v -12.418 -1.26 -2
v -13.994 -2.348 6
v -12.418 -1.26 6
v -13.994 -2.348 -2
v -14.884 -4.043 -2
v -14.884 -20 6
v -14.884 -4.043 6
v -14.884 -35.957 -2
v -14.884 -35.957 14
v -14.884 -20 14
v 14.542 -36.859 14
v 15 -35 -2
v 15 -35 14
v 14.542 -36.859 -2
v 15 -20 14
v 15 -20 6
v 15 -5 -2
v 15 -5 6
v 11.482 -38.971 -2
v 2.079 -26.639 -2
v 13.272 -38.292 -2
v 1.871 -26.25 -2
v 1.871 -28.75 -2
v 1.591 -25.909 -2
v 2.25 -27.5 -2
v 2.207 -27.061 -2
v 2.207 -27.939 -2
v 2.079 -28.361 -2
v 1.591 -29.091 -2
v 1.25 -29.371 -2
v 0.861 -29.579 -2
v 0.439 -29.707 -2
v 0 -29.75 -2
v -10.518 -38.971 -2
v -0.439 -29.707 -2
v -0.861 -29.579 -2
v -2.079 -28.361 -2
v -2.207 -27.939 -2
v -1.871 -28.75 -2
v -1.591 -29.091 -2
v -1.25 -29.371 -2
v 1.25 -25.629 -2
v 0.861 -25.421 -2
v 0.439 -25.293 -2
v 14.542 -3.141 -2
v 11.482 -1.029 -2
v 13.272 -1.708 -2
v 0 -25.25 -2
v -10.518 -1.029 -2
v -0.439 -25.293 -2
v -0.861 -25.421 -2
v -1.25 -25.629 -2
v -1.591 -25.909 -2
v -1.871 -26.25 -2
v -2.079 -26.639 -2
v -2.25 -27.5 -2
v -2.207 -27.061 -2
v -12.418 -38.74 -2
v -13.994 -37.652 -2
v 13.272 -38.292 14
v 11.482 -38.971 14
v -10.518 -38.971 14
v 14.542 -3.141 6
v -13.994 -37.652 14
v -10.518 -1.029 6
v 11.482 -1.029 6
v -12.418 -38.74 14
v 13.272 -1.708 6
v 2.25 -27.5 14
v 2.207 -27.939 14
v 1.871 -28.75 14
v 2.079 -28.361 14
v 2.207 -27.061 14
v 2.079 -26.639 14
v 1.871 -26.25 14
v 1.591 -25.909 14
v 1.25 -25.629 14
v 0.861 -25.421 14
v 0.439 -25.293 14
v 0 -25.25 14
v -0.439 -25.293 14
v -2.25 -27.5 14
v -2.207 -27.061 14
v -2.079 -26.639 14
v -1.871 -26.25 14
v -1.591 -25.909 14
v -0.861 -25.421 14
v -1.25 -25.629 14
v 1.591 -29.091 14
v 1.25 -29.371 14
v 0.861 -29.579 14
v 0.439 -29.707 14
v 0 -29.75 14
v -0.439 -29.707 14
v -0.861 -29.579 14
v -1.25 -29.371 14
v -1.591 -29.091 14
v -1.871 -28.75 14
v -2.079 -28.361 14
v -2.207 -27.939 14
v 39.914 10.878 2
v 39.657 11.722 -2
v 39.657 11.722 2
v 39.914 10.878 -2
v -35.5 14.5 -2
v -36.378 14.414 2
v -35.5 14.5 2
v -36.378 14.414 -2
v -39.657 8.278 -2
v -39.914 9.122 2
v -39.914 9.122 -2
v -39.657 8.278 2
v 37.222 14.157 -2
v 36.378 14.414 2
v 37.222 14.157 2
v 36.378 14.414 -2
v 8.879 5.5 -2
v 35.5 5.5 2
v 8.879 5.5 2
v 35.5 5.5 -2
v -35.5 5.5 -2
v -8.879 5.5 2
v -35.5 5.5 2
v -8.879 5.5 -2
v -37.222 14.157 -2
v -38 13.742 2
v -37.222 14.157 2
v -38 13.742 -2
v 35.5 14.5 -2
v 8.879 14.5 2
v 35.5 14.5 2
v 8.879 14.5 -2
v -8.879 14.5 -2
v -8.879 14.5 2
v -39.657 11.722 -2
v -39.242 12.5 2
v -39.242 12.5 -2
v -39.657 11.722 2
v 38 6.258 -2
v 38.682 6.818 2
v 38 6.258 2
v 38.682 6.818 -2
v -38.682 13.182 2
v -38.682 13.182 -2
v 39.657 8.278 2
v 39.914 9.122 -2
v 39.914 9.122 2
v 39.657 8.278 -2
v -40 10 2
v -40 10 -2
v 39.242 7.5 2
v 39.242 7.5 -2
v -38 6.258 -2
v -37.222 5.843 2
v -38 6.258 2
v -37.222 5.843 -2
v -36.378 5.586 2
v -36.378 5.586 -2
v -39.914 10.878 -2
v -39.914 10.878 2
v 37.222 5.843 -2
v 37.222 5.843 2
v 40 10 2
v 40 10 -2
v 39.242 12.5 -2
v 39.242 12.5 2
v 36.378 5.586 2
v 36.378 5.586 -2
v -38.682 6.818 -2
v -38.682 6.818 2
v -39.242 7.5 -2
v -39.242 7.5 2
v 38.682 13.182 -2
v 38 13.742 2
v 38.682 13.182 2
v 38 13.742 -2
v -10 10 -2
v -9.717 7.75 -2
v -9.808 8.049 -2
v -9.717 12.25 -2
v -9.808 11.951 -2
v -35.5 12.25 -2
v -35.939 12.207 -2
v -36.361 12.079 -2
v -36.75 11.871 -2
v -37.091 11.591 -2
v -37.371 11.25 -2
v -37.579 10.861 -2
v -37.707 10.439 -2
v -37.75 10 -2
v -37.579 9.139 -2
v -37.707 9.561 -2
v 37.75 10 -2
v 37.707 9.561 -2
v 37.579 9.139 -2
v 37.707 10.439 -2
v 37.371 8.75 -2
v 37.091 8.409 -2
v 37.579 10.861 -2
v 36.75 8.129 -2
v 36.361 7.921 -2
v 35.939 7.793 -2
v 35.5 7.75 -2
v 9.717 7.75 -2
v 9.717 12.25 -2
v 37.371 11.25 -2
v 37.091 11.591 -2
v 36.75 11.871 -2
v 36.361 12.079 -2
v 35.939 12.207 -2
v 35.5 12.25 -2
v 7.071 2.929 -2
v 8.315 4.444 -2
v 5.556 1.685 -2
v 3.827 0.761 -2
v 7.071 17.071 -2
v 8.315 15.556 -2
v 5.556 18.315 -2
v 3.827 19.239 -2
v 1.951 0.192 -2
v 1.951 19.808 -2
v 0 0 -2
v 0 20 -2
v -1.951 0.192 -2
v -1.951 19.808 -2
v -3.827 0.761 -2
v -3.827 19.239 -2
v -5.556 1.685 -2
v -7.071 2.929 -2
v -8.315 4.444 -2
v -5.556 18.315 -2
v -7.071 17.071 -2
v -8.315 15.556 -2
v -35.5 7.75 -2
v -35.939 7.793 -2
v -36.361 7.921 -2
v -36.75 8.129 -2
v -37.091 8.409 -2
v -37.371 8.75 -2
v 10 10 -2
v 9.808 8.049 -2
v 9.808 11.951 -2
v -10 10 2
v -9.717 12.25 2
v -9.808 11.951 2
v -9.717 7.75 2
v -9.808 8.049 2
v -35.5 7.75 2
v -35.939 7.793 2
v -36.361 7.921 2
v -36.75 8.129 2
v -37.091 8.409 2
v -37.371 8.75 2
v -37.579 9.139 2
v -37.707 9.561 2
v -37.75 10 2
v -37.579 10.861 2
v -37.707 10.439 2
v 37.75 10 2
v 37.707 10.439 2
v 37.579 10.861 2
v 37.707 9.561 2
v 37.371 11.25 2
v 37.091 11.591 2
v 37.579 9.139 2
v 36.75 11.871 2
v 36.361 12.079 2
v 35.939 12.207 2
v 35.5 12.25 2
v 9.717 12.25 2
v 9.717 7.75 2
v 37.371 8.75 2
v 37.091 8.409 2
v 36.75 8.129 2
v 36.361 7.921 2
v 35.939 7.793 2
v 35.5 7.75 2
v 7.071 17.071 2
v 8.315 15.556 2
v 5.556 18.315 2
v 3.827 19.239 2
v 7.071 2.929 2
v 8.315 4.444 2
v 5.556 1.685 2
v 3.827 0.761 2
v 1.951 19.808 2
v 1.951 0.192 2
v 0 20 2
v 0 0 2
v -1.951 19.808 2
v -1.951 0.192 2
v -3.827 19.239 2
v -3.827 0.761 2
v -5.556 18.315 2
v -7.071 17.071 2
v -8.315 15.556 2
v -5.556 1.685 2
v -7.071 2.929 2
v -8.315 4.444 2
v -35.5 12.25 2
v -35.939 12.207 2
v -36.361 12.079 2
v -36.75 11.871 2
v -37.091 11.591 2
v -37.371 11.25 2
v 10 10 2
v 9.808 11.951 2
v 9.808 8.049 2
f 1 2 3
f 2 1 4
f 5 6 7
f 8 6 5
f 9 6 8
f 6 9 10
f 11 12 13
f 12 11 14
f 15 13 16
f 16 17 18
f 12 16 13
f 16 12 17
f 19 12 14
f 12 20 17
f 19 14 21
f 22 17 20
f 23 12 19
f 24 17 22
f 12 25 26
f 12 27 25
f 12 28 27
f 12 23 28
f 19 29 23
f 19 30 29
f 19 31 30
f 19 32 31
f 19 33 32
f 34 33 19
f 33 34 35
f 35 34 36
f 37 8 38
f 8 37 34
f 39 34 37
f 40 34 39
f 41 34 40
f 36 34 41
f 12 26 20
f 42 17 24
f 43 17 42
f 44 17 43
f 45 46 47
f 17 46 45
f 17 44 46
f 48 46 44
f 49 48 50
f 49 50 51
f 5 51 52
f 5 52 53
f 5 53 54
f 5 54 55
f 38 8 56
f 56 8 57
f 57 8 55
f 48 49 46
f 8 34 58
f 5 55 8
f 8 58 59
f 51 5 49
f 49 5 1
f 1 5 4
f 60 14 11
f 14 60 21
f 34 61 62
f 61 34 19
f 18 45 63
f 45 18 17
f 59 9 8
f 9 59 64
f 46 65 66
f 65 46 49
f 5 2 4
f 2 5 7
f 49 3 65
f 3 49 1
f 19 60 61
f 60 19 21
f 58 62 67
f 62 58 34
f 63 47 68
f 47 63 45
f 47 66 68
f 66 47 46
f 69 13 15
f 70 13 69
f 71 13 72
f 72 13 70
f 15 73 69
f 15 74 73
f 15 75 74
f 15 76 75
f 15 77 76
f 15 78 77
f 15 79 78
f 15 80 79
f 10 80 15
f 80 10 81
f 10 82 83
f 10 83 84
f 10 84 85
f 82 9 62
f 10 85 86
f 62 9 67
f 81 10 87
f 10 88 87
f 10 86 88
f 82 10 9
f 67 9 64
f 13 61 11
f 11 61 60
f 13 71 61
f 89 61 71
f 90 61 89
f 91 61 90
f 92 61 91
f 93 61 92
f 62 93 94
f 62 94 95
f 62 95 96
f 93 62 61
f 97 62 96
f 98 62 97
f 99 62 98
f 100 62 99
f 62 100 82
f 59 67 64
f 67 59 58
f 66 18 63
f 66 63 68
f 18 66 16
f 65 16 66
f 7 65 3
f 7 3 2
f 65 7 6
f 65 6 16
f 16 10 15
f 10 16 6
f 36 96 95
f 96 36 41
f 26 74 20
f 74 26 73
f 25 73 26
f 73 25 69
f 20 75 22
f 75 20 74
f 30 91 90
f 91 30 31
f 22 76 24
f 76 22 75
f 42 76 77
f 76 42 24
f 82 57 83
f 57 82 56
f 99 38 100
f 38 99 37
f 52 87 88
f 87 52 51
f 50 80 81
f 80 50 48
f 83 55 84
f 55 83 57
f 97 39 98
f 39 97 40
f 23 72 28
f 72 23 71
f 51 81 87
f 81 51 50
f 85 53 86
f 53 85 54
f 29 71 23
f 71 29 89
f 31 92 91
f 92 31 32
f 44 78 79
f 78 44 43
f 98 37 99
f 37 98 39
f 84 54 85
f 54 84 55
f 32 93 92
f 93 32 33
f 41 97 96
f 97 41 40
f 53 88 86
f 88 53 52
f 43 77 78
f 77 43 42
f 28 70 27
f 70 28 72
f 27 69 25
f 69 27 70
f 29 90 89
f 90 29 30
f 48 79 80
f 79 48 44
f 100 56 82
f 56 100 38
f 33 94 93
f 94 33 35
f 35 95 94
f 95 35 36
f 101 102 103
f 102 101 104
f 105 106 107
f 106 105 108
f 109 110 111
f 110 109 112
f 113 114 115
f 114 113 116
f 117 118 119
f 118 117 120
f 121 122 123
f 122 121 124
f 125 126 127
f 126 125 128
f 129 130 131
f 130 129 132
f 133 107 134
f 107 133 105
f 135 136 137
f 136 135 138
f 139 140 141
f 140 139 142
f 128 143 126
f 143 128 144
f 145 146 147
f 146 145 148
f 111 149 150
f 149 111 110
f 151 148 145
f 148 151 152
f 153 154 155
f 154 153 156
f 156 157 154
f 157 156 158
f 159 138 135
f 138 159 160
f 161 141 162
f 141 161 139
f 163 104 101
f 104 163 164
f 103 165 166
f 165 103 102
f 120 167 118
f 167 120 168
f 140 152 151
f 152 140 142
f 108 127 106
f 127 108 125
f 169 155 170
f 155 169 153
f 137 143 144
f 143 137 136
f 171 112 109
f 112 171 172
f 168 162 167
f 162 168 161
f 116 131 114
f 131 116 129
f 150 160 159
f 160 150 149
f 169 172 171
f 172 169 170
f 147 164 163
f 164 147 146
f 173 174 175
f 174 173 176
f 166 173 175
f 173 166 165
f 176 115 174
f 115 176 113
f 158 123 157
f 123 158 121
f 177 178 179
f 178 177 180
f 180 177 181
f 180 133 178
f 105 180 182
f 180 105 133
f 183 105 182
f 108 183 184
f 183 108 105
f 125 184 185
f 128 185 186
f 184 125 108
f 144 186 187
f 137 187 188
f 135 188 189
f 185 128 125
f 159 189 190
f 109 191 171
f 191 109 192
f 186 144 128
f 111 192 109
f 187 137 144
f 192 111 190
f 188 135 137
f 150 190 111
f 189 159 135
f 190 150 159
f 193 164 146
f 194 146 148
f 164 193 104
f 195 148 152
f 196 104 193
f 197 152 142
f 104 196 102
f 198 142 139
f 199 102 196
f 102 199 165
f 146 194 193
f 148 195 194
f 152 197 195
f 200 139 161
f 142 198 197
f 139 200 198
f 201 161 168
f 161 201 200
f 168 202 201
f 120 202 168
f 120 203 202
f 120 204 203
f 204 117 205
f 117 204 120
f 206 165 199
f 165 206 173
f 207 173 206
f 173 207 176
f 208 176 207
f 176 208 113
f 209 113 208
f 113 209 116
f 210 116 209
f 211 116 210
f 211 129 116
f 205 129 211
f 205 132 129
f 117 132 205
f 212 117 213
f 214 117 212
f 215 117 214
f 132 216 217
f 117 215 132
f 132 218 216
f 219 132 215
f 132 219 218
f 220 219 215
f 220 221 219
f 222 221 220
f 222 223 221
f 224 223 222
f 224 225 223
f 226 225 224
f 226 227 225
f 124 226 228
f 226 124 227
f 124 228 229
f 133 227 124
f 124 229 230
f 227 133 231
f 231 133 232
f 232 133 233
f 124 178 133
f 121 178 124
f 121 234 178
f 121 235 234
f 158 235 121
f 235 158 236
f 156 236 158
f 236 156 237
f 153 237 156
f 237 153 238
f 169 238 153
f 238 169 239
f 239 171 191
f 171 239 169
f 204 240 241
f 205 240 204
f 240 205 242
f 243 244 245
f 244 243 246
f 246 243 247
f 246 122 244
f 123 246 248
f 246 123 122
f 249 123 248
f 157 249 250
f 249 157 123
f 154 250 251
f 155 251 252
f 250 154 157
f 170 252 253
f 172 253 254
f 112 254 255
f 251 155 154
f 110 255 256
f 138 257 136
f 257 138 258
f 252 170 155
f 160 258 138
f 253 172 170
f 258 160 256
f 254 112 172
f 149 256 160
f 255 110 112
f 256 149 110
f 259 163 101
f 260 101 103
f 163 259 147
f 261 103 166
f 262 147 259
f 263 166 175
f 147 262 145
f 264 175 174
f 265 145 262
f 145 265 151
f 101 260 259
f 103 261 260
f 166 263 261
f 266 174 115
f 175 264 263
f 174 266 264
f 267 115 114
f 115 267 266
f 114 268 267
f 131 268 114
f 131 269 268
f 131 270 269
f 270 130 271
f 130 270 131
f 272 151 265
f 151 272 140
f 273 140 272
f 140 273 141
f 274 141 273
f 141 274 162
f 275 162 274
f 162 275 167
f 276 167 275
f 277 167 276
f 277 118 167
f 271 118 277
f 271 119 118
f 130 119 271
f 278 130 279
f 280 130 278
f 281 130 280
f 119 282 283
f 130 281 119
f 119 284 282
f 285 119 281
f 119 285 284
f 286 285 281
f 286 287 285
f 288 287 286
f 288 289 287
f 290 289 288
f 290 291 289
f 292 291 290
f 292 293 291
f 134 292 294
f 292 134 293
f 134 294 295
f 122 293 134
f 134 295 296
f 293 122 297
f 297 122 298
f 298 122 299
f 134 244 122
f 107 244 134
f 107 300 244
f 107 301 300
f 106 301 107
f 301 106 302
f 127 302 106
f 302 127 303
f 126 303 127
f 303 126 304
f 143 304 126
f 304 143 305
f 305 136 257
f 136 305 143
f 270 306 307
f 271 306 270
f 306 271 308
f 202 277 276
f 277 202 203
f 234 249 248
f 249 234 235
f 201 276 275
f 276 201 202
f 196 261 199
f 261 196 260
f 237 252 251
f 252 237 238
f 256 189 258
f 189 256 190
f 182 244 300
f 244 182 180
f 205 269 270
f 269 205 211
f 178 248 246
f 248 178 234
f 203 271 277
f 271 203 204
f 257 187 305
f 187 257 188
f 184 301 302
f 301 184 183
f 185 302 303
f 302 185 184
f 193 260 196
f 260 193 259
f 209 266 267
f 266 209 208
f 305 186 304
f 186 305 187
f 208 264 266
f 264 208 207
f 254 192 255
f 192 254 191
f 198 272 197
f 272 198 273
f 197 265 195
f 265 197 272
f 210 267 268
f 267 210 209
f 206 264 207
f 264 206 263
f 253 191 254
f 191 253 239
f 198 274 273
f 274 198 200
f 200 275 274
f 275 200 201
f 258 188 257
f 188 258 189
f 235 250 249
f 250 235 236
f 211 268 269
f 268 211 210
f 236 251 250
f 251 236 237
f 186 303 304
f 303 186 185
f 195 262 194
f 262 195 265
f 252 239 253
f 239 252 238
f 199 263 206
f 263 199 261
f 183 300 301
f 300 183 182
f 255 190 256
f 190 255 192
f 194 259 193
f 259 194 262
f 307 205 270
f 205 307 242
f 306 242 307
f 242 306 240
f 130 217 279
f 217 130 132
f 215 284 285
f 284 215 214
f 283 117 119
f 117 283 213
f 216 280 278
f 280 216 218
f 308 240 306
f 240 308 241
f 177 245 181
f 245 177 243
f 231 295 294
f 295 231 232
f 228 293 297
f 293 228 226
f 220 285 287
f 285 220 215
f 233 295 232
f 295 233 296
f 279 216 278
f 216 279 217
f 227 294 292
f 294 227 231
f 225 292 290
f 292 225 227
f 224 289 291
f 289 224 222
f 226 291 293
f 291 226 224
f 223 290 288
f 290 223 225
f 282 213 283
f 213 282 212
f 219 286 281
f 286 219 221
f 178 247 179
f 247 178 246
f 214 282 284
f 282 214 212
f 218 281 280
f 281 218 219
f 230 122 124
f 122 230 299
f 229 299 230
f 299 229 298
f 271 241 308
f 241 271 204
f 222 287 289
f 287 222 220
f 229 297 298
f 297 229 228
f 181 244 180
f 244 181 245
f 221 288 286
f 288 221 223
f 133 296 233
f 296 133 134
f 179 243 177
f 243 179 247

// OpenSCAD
len_phone = 145;
d_screw_m4 = 4.5;
width_phone = 56;
thikness_holder = 4;
thikness_phone = 8;
append = 15;
corner_round = 8;
w_grip = 30;

//holder_set();
//vertical_block(len_phone);
test_print_holder();

module test_print_holder() {
    translate([0,-20, 6])
    grip();
    horizontal_block(len_block=width_phone, offset_vertical=10);
}

module grip() {
    difference() {
        grip_base();
        
        color("red")
        translate([0, w_grip/2, thikness_phone])
        cube([w_grip+1, w_grip, 2*thikness_phone], center=true);
        
        translate([0, -w_grip/4, 0])
        cylinder(d=d_screw_m4, 3*thikness_phone, center=true, $fn=32);
    }
}


module grip_base() {
    hull() {
        translate([w_grip/2-corner_round/2, -w_grip/2, 0])
        cylinder(d=corner_round, 2*thikness_phone, center=true);
        
        translate([-w_grip/2+corner_round/2, -w_grip/2, 0])
        cylinder(d=corner_round, 2*thikness_phone, center=true);
        
        translate([w_grip/2-corner_round/2, w_grip/2, 0])
        cylinder(d=corner_round, 2*thikness_phone, center=true);
        
        translate([-w_grip/2+corner_round/2, w_grip/2, 0])
        cylinder(d=corner_round, 2*thikness_phone, center=true);
    }
}


module horizontal_block(len_block, offset_vertical) {
    len_block = len_block + append;
    
    translate([0, offset_vertical, 0])
    cylinder(d=20, h=thikness_holder, center=true, $fn=32);
    
    difference() {
        hull() {
            translate([len_block/2, offset_vertical, 0])
            cylinder(d=9, h=thikness_holder, center=true, $fn=32);
            
            translate([-len_block/2, offset_vertical, 0])
            cylinder(d=9, h=thikness_holder, center=true, $fn=32);
        }
        color("red")
        hull() {
            translate([len_block/2, offset_vertical, 0])
            cylinder(d=d_screw_m4, h=thikness_holder+2, center=true, $fn=32);
            
            translate([-len_block/2, offset_vertical, 0])
            cylinder(d=d_screw_m4, h=thikness_holder+2, center=true, $fn=32);
        }
    }
}


module vertical_block(len_block) {
    len_block = len_block + append;
    
        difference() {
            hull() {
                //translate([0, -len_phone/2, 0])
                translate([0, -len_block/2, 0])
                cylinder(d=9, h=thikness_holder, center=true, $fn=32);
                
                //translate([0, -len_phone/2, 0])
                translate([0, len_block/2, 0])
                cylinder(d=9, h=thikness_holder, center=true, $fn=32);
            }
            color("red")
            hull() {
                //translate([0, -len_phone/2, 0])
                translate([0, -len_block/2, 0])
                cylinder(d=d_screw_m4, h=thikness_holder+2, center=true, $fn=32);
                
                //translate([0, -len_phone/2, 0])
                translate([0, len_block/2, 0])
                cylinder(d=d_screw_m4, h=thikness_holder+2, center=true, $fn=32);
        }
    }
}

module holder_set() {
    horizontal_block(len_block=width_phone, offset_vertical=10);
    vertical_block(len_block=len_phone);
    
    translate([0, -len_phone/2, thikness_phone+thikness_holder/2+1])
    rotate([0, 180, 0])
    grip();
    
    translate([0, len_phone/2, thikness_phone+thikness_holder/2])
    rotate([0, 180, 180])
    grip();
    
    translate([width_phone/2, 10, thikness_phone+thikness_holder/2])
    rotate([0, 180, 90])
    grip();
    
    translate([-width_phone/2, 10, thikness_phone+thikness_holder/2])
    rotate([0, 180, -90])
    grip();
}
